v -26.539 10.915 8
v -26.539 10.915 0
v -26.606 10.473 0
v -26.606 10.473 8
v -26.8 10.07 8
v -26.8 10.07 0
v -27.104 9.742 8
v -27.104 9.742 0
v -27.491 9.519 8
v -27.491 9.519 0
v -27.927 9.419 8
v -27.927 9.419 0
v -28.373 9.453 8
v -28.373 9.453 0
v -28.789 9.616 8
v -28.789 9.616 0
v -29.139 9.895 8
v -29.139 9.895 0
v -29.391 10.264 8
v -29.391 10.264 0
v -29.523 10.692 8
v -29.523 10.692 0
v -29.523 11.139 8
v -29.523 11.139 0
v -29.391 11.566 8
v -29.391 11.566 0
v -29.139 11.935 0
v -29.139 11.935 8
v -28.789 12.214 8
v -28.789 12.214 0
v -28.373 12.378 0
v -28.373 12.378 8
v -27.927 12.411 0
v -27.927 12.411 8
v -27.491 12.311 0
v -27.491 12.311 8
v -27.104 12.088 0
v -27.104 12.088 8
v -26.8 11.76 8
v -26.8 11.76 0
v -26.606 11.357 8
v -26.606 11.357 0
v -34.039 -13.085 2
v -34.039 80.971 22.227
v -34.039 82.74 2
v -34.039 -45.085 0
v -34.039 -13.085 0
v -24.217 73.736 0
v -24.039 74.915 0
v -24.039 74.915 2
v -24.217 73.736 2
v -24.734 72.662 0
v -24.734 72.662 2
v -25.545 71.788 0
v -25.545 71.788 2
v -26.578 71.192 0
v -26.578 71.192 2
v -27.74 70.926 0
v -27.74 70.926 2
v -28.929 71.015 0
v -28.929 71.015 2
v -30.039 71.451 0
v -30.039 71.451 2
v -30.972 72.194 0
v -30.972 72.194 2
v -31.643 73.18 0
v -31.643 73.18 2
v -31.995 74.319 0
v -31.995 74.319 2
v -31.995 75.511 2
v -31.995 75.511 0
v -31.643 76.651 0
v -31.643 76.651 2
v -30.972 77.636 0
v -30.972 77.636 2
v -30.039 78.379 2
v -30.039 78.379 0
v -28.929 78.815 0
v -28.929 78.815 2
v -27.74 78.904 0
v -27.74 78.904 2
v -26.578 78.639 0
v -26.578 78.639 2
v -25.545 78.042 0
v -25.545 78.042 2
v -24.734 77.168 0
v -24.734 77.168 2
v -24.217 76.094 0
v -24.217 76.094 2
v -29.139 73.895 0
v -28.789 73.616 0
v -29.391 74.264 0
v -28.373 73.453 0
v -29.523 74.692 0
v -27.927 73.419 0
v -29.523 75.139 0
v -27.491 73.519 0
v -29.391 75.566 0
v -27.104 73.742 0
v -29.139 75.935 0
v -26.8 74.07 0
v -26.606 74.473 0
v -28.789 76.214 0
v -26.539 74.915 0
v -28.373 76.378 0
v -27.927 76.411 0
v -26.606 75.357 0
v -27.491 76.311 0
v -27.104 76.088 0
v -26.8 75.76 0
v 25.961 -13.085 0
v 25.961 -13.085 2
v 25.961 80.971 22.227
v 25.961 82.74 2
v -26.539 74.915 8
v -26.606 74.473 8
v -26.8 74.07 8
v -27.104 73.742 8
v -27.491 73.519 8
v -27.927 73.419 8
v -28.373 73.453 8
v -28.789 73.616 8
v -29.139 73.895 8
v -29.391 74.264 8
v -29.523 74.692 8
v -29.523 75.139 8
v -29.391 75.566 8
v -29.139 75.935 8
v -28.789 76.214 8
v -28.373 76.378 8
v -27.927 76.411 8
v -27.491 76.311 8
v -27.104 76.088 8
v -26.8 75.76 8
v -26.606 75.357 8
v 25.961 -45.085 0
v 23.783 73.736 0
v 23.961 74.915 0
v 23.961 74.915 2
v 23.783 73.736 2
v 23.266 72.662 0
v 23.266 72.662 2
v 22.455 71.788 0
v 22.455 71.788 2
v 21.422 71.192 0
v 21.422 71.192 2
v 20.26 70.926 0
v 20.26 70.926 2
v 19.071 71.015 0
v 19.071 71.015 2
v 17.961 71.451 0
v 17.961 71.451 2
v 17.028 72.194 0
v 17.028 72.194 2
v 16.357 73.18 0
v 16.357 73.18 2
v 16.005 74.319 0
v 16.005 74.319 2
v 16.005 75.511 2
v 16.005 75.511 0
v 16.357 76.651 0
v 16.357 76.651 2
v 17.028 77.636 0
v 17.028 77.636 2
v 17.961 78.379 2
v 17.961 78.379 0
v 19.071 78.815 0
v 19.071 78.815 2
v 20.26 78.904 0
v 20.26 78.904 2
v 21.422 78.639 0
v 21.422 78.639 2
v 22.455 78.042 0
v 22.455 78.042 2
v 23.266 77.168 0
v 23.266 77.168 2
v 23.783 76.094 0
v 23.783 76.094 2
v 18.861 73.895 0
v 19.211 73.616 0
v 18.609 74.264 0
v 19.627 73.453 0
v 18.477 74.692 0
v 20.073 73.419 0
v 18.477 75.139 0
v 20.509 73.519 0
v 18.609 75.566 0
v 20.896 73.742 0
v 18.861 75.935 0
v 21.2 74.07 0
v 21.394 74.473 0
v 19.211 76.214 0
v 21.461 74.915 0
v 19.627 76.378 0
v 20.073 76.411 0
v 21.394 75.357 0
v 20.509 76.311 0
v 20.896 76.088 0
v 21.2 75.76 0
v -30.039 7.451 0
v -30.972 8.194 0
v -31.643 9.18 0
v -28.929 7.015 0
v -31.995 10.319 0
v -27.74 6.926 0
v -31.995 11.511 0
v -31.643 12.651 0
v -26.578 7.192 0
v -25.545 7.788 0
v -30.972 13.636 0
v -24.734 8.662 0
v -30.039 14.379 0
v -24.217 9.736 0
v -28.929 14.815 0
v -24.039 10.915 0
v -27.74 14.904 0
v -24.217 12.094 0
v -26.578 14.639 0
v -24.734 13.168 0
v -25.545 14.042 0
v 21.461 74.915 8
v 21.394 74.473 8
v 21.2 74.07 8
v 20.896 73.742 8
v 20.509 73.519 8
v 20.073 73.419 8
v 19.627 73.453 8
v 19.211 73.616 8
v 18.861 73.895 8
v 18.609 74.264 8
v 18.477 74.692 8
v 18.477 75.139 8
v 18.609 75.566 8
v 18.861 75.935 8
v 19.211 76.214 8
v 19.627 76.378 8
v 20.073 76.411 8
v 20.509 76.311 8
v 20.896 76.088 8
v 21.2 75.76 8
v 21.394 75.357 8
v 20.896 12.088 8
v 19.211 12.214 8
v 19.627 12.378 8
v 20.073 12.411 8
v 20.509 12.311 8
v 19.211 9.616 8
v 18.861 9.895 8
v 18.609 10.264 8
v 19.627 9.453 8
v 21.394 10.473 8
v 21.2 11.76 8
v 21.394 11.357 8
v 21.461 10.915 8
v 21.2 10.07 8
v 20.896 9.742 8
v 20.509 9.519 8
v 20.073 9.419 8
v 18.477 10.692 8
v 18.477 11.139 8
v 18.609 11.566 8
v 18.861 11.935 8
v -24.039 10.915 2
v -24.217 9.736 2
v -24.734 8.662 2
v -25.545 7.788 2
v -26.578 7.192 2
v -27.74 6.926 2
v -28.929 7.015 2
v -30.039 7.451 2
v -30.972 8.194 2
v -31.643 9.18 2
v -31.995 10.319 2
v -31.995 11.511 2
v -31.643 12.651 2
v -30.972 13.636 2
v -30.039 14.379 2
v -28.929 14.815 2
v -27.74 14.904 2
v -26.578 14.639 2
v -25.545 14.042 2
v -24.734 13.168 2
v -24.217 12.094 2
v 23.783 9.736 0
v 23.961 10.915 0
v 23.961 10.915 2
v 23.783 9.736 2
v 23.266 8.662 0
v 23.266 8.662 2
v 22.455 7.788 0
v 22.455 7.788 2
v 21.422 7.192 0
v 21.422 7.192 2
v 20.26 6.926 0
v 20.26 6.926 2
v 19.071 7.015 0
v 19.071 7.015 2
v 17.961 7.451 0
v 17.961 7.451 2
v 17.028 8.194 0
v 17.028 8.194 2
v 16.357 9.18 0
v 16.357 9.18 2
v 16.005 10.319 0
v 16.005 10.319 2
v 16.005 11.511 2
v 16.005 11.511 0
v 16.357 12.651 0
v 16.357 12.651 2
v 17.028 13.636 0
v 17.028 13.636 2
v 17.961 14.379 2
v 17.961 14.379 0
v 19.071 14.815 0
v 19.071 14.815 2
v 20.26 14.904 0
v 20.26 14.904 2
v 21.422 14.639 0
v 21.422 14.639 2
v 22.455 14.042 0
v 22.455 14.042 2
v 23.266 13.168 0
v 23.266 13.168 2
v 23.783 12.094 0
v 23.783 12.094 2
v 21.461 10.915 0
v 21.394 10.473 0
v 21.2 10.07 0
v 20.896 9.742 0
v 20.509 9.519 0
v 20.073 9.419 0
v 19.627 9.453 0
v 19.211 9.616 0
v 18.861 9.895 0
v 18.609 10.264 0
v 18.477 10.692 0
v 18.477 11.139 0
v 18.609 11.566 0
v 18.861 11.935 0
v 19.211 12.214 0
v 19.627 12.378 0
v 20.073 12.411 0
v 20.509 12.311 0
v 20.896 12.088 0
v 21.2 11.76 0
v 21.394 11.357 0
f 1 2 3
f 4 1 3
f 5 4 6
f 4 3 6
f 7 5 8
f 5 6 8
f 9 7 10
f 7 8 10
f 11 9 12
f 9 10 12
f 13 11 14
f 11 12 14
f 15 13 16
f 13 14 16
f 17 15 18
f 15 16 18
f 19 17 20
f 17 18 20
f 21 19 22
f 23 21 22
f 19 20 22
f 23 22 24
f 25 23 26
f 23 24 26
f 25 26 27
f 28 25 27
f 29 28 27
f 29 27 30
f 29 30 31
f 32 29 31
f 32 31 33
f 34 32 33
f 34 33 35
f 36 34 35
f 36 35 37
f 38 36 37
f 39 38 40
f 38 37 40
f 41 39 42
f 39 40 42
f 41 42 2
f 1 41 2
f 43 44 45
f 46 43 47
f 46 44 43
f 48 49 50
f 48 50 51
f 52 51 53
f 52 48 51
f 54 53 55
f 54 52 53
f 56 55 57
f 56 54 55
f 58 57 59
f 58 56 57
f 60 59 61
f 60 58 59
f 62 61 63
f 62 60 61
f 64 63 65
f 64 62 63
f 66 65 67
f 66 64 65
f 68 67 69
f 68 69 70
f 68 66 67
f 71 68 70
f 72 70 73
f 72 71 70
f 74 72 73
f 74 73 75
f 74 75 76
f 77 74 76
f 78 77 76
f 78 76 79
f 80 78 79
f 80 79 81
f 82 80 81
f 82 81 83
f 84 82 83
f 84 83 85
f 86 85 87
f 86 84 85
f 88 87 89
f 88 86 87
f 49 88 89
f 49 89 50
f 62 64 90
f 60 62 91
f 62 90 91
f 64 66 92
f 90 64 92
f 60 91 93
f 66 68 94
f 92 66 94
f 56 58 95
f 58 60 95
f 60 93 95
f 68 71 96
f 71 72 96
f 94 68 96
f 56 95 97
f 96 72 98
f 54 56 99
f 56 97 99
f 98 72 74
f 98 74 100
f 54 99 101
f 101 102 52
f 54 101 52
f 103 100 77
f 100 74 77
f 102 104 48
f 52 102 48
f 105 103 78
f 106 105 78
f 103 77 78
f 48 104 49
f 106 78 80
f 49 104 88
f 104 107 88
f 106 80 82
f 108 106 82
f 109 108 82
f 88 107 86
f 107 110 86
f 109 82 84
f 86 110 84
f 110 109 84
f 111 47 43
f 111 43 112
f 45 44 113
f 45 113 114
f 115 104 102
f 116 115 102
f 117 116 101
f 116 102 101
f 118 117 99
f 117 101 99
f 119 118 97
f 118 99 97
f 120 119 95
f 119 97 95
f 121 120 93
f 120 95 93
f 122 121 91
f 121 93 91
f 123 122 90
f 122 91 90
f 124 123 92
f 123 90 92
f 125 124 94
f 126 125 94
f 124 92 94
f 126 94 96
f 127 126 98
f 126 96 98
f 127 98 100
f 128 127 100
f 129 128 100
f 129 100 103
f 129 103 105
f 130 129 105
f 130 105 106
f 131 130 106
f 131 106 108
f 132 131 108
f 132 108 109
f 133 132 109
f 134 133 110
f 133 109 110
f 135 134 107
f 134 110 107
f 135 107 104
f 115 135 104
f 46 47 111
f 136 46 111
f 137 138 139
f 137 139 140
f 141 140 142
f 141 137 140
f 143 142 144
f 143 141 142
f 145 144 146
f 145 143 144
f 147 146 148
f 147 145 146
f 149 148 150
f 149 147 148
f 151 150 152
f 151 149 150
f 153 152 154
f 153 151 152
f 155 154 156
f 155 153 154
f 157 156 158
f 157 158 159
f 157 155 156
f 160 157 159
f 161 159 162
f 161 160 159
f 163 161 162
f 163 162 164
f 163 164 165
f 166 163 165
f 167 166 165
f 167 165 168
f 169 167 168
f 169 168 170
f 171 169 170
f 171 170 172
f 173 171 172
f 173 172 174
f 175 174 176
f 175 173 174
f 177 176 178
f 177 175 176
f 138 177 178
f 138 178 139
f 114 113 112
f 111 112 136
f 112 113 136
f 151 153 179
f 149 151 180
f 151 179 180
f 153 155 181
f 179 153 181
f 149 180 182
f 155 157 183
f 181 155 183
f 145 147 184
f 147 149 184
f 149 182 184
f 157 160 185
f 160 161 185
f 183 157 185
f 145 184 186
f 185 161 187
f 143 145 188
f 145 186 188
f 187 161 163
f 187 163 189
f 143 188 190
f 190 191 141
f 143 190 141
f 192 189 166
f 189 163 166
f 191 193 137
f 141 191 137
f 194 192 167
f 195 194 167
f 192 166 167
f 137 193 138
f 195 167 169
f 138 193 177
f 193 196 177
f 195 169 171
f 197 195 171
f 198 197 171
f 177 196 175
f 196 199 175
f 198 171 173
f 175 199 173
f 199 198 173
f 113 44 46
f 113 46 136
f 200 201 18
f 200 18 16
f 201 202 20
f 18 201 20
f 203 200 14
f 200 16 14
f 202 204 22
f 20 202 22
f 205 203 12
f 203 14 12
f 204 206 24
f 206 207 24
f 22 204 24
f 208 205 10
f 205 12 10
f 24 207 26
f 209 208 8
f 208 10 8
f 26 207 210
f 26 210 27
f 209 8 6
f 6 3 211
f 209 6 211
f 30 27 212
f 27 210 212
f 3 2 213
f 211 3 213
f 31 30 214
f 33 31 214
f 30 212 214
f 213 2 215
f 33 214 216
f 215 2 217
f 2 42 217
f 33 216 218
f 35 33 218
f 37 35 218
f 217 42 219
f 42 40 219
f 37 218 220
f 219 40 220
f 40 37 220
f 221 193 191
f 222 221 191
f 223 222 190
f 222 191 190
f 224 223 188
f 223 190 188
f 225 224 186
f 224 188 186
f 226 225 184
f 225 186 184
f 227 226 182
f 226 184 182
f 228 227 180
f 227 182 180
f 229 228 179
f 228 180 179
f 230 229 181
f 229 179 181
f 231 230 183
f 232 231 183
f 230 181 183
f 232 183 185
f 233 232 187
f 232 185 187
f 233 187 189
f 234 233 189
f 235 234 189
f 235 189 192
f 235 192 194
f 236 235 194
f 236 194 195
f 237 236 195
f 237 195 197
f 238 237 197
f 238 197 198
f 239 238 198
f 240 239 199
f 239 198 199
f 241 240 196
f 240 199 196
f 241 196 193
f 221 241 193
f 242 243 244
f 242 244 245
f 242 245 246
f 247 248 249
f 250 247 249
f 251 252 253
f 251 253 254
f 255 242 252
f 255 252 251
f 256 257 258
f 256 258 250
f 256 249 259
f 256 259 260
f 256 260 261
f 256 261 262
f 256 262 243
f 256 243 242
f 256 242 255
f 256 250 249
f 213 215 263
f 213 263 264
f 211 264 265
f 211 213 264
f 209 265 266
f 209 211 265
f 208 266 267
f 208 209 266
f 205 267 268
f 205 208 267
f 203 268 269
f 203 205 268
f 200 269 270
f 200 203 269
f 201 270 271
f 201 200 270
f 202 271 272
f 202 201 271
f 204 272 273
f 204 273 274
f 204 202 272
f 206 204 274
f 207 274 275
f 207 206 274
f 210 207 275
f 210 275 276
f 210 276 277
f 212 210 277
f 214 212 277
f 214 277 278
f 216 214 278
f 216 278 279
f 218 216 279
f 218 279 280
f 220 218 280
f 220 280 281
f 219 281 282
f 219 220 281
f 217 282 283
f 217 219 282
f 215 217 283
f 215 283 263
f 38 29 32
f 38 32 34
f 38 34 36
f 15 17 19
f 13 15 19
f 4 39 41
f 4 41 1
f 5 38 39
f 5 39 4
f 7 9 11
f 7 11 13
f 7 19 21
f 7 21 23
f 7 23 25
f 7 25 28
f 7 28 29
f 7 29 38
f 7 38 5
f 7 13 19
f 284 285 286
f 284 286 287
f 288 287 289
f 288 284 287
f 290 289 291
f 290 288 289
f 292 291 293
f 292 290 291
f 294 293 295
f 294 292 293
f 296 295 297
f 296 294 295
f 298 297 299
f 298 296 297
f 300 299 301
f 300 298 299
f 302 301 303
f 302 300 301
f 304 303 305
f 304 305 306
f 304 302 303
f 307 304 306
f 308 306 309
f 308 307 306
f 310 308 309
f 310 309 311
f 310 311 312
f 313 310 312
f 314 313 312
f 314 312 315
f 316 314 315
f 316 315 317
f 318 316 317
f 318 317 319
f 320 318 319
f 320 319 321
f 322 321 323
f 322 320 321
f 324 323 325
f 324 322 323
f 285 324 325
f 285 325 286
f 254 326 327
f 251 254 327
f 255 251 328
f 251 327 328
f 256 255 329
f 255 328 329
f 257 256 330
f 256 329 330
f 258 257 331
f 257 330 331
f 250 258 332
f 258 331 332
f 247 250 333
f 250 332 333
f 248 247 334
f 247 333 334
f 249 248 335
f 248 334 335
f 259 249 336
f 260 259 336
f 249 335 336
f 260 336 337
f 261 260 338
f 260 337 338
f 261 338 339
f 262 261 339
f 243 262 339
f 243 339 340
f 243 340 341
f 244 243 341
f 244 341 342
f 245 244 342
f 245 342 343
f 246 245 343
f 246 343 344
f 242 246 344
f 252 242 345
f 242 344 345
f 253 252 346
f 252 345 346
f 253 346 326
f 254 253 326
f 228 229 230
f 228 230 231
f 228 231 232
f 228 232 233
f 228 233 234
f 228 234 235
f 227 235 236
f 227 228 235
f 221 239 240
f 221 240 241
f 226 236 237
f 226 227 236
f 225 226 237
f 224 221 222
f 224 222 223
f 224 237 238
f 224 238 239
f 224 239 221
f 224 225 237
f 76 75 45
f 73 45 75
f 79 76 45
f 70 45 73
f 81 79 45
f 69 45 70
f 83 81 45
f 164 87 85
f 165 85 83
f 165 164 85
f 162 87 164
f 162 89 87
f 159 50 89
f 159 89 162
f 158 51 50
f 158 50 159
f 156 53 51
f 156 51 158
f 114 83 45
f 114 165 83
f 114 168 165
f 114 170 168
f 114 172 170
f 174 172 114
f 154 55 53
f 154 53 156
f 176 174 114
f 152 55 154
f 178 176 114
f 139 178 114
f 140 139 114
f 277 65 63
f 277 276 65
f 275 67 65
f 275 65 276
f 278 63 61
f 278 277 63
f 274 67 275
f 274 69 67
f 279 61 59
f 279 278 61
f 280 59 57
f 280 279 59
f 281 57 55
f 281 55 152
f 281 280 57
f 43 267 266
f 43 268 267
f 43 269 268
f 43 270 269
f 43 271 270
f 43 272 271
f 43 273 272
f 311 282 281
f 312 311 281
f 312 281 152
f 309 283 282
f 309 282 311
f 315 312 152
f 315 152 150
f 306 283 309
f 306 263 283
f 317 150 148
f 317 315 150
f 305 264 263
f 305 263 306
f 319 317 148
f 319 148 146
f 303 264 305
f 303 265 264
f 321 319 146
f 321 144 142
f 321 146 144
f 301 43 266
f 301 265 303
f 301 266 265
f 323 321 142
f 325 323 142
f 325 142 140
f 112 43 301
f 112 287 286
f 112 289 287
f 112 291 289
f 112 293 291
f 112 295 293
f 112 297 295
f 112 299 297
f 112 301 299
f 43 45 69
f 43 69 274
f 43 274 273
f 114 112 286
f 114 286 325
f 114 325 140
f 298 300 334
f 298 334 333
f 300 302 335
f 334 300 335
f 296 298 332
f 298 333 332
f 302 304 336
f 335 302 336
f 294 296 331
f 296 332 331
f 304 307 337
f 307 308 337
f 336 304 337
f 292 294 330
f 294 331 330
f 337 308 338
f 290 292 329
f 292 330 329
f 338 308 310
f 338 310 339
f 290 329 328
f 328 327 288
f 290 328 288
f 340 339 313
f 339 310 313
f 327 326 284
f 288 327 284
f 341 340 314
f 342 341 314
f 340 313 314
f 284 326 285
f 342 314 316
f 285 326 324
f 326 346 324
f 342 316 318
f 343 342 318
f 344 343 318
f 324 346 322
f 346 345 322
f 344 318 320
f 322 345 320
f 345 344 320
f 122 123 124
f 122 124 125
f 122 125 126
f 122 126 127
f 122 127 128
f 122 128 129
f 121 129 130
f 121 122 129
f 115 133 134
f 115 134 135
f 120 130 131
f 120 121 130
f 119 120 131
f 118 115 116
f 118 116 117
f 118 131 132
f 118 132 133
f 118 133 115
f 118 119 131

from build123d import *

# Parameters (mm, degrees)
F0_W     = 60
F0_H     = 128
F1_ANGLE = 10
F3_DEPTH = 60.001
F4_W     = 60
F4_H     = 96
F4_R     = 4
F5_DEPTH = 2
F4_R_2   = 1.5
F6_DEPTH = 8


with BuildPart() as f1:
    # F0 (on Top) → F1 (revolve)
    with BuildSketch(Plane.XY):
        with Locations((-4.03933, 18.915136)):
            Rectangle(F0_W, F0_H)
    revolve(axis=Axis((-4.03933, -45.084864, 0), (1, 0, 0)), revolution_arc=F1_ANGLE)

    # F2 (on face) → F3 (cut, through all)
    with BuildSketch(Plane.YZ.offset(25.96067)):
        with BuildLine():
            Line((80.970529, 22.226967), (82.915136, 0))
            ThreePointArc((82.915136, 0), (82.428058, 11.155935), (80.970529, 22.226967))
        make_face()
    extrude(amount=-F3_DEPTH, mode=Mode.SUBTRACT)

    # F4 (on face) → F5 (cut)
    with BuildSketch(Plane(origin=(0, 0, 0), x_dir=(1, 0, 0), z_dir=(0, 0, -1))):
        with Locations((-4.03933, -34.915136)):
            Rectangle(F4_W, F4_H)
        with Locations((-28.03933, -74.915136)):
            Circle(F4_R, mode=Mode.SUBTRACT)
        with Locations((19.96067, -74.915136)):
            Circle(F4_R, mode=Mode.SUBTRACT)
        with Locations((-28.03933, -10.915136)):
            Circle(F4_R, mode=Mode.SUBTRACT)
        with Locations((19.96067, -10.915136)):
            Circle(F4_R, mode=Mode.SUBTRACT)
    extrude(amount=-F5_DEPTH, mode=Mode.SUBTRACT)

    # F4 (on face) → F6 (cut)
    with BuildSketch(Plane(origin=(0, 0, 0), x_dir=(1, 0, 0), z_dir=(0, 0, -1))):
        with Locations((-28.03933, -10.915136)):
            Circle(F4_R_2)
        with Locations((19.96067, -10.915136)):
            Circle(F4_R_2)
        with Locations((19.96067, -74.915136)):
            Circle(F4_R_2)
        with Locations((-28.03933, -74.915136)):
            Circle(F4_R_2)
    extrude(amount=-F6_DEPTH, mode=Mode.SUBTRACT)


solid = f1.part
